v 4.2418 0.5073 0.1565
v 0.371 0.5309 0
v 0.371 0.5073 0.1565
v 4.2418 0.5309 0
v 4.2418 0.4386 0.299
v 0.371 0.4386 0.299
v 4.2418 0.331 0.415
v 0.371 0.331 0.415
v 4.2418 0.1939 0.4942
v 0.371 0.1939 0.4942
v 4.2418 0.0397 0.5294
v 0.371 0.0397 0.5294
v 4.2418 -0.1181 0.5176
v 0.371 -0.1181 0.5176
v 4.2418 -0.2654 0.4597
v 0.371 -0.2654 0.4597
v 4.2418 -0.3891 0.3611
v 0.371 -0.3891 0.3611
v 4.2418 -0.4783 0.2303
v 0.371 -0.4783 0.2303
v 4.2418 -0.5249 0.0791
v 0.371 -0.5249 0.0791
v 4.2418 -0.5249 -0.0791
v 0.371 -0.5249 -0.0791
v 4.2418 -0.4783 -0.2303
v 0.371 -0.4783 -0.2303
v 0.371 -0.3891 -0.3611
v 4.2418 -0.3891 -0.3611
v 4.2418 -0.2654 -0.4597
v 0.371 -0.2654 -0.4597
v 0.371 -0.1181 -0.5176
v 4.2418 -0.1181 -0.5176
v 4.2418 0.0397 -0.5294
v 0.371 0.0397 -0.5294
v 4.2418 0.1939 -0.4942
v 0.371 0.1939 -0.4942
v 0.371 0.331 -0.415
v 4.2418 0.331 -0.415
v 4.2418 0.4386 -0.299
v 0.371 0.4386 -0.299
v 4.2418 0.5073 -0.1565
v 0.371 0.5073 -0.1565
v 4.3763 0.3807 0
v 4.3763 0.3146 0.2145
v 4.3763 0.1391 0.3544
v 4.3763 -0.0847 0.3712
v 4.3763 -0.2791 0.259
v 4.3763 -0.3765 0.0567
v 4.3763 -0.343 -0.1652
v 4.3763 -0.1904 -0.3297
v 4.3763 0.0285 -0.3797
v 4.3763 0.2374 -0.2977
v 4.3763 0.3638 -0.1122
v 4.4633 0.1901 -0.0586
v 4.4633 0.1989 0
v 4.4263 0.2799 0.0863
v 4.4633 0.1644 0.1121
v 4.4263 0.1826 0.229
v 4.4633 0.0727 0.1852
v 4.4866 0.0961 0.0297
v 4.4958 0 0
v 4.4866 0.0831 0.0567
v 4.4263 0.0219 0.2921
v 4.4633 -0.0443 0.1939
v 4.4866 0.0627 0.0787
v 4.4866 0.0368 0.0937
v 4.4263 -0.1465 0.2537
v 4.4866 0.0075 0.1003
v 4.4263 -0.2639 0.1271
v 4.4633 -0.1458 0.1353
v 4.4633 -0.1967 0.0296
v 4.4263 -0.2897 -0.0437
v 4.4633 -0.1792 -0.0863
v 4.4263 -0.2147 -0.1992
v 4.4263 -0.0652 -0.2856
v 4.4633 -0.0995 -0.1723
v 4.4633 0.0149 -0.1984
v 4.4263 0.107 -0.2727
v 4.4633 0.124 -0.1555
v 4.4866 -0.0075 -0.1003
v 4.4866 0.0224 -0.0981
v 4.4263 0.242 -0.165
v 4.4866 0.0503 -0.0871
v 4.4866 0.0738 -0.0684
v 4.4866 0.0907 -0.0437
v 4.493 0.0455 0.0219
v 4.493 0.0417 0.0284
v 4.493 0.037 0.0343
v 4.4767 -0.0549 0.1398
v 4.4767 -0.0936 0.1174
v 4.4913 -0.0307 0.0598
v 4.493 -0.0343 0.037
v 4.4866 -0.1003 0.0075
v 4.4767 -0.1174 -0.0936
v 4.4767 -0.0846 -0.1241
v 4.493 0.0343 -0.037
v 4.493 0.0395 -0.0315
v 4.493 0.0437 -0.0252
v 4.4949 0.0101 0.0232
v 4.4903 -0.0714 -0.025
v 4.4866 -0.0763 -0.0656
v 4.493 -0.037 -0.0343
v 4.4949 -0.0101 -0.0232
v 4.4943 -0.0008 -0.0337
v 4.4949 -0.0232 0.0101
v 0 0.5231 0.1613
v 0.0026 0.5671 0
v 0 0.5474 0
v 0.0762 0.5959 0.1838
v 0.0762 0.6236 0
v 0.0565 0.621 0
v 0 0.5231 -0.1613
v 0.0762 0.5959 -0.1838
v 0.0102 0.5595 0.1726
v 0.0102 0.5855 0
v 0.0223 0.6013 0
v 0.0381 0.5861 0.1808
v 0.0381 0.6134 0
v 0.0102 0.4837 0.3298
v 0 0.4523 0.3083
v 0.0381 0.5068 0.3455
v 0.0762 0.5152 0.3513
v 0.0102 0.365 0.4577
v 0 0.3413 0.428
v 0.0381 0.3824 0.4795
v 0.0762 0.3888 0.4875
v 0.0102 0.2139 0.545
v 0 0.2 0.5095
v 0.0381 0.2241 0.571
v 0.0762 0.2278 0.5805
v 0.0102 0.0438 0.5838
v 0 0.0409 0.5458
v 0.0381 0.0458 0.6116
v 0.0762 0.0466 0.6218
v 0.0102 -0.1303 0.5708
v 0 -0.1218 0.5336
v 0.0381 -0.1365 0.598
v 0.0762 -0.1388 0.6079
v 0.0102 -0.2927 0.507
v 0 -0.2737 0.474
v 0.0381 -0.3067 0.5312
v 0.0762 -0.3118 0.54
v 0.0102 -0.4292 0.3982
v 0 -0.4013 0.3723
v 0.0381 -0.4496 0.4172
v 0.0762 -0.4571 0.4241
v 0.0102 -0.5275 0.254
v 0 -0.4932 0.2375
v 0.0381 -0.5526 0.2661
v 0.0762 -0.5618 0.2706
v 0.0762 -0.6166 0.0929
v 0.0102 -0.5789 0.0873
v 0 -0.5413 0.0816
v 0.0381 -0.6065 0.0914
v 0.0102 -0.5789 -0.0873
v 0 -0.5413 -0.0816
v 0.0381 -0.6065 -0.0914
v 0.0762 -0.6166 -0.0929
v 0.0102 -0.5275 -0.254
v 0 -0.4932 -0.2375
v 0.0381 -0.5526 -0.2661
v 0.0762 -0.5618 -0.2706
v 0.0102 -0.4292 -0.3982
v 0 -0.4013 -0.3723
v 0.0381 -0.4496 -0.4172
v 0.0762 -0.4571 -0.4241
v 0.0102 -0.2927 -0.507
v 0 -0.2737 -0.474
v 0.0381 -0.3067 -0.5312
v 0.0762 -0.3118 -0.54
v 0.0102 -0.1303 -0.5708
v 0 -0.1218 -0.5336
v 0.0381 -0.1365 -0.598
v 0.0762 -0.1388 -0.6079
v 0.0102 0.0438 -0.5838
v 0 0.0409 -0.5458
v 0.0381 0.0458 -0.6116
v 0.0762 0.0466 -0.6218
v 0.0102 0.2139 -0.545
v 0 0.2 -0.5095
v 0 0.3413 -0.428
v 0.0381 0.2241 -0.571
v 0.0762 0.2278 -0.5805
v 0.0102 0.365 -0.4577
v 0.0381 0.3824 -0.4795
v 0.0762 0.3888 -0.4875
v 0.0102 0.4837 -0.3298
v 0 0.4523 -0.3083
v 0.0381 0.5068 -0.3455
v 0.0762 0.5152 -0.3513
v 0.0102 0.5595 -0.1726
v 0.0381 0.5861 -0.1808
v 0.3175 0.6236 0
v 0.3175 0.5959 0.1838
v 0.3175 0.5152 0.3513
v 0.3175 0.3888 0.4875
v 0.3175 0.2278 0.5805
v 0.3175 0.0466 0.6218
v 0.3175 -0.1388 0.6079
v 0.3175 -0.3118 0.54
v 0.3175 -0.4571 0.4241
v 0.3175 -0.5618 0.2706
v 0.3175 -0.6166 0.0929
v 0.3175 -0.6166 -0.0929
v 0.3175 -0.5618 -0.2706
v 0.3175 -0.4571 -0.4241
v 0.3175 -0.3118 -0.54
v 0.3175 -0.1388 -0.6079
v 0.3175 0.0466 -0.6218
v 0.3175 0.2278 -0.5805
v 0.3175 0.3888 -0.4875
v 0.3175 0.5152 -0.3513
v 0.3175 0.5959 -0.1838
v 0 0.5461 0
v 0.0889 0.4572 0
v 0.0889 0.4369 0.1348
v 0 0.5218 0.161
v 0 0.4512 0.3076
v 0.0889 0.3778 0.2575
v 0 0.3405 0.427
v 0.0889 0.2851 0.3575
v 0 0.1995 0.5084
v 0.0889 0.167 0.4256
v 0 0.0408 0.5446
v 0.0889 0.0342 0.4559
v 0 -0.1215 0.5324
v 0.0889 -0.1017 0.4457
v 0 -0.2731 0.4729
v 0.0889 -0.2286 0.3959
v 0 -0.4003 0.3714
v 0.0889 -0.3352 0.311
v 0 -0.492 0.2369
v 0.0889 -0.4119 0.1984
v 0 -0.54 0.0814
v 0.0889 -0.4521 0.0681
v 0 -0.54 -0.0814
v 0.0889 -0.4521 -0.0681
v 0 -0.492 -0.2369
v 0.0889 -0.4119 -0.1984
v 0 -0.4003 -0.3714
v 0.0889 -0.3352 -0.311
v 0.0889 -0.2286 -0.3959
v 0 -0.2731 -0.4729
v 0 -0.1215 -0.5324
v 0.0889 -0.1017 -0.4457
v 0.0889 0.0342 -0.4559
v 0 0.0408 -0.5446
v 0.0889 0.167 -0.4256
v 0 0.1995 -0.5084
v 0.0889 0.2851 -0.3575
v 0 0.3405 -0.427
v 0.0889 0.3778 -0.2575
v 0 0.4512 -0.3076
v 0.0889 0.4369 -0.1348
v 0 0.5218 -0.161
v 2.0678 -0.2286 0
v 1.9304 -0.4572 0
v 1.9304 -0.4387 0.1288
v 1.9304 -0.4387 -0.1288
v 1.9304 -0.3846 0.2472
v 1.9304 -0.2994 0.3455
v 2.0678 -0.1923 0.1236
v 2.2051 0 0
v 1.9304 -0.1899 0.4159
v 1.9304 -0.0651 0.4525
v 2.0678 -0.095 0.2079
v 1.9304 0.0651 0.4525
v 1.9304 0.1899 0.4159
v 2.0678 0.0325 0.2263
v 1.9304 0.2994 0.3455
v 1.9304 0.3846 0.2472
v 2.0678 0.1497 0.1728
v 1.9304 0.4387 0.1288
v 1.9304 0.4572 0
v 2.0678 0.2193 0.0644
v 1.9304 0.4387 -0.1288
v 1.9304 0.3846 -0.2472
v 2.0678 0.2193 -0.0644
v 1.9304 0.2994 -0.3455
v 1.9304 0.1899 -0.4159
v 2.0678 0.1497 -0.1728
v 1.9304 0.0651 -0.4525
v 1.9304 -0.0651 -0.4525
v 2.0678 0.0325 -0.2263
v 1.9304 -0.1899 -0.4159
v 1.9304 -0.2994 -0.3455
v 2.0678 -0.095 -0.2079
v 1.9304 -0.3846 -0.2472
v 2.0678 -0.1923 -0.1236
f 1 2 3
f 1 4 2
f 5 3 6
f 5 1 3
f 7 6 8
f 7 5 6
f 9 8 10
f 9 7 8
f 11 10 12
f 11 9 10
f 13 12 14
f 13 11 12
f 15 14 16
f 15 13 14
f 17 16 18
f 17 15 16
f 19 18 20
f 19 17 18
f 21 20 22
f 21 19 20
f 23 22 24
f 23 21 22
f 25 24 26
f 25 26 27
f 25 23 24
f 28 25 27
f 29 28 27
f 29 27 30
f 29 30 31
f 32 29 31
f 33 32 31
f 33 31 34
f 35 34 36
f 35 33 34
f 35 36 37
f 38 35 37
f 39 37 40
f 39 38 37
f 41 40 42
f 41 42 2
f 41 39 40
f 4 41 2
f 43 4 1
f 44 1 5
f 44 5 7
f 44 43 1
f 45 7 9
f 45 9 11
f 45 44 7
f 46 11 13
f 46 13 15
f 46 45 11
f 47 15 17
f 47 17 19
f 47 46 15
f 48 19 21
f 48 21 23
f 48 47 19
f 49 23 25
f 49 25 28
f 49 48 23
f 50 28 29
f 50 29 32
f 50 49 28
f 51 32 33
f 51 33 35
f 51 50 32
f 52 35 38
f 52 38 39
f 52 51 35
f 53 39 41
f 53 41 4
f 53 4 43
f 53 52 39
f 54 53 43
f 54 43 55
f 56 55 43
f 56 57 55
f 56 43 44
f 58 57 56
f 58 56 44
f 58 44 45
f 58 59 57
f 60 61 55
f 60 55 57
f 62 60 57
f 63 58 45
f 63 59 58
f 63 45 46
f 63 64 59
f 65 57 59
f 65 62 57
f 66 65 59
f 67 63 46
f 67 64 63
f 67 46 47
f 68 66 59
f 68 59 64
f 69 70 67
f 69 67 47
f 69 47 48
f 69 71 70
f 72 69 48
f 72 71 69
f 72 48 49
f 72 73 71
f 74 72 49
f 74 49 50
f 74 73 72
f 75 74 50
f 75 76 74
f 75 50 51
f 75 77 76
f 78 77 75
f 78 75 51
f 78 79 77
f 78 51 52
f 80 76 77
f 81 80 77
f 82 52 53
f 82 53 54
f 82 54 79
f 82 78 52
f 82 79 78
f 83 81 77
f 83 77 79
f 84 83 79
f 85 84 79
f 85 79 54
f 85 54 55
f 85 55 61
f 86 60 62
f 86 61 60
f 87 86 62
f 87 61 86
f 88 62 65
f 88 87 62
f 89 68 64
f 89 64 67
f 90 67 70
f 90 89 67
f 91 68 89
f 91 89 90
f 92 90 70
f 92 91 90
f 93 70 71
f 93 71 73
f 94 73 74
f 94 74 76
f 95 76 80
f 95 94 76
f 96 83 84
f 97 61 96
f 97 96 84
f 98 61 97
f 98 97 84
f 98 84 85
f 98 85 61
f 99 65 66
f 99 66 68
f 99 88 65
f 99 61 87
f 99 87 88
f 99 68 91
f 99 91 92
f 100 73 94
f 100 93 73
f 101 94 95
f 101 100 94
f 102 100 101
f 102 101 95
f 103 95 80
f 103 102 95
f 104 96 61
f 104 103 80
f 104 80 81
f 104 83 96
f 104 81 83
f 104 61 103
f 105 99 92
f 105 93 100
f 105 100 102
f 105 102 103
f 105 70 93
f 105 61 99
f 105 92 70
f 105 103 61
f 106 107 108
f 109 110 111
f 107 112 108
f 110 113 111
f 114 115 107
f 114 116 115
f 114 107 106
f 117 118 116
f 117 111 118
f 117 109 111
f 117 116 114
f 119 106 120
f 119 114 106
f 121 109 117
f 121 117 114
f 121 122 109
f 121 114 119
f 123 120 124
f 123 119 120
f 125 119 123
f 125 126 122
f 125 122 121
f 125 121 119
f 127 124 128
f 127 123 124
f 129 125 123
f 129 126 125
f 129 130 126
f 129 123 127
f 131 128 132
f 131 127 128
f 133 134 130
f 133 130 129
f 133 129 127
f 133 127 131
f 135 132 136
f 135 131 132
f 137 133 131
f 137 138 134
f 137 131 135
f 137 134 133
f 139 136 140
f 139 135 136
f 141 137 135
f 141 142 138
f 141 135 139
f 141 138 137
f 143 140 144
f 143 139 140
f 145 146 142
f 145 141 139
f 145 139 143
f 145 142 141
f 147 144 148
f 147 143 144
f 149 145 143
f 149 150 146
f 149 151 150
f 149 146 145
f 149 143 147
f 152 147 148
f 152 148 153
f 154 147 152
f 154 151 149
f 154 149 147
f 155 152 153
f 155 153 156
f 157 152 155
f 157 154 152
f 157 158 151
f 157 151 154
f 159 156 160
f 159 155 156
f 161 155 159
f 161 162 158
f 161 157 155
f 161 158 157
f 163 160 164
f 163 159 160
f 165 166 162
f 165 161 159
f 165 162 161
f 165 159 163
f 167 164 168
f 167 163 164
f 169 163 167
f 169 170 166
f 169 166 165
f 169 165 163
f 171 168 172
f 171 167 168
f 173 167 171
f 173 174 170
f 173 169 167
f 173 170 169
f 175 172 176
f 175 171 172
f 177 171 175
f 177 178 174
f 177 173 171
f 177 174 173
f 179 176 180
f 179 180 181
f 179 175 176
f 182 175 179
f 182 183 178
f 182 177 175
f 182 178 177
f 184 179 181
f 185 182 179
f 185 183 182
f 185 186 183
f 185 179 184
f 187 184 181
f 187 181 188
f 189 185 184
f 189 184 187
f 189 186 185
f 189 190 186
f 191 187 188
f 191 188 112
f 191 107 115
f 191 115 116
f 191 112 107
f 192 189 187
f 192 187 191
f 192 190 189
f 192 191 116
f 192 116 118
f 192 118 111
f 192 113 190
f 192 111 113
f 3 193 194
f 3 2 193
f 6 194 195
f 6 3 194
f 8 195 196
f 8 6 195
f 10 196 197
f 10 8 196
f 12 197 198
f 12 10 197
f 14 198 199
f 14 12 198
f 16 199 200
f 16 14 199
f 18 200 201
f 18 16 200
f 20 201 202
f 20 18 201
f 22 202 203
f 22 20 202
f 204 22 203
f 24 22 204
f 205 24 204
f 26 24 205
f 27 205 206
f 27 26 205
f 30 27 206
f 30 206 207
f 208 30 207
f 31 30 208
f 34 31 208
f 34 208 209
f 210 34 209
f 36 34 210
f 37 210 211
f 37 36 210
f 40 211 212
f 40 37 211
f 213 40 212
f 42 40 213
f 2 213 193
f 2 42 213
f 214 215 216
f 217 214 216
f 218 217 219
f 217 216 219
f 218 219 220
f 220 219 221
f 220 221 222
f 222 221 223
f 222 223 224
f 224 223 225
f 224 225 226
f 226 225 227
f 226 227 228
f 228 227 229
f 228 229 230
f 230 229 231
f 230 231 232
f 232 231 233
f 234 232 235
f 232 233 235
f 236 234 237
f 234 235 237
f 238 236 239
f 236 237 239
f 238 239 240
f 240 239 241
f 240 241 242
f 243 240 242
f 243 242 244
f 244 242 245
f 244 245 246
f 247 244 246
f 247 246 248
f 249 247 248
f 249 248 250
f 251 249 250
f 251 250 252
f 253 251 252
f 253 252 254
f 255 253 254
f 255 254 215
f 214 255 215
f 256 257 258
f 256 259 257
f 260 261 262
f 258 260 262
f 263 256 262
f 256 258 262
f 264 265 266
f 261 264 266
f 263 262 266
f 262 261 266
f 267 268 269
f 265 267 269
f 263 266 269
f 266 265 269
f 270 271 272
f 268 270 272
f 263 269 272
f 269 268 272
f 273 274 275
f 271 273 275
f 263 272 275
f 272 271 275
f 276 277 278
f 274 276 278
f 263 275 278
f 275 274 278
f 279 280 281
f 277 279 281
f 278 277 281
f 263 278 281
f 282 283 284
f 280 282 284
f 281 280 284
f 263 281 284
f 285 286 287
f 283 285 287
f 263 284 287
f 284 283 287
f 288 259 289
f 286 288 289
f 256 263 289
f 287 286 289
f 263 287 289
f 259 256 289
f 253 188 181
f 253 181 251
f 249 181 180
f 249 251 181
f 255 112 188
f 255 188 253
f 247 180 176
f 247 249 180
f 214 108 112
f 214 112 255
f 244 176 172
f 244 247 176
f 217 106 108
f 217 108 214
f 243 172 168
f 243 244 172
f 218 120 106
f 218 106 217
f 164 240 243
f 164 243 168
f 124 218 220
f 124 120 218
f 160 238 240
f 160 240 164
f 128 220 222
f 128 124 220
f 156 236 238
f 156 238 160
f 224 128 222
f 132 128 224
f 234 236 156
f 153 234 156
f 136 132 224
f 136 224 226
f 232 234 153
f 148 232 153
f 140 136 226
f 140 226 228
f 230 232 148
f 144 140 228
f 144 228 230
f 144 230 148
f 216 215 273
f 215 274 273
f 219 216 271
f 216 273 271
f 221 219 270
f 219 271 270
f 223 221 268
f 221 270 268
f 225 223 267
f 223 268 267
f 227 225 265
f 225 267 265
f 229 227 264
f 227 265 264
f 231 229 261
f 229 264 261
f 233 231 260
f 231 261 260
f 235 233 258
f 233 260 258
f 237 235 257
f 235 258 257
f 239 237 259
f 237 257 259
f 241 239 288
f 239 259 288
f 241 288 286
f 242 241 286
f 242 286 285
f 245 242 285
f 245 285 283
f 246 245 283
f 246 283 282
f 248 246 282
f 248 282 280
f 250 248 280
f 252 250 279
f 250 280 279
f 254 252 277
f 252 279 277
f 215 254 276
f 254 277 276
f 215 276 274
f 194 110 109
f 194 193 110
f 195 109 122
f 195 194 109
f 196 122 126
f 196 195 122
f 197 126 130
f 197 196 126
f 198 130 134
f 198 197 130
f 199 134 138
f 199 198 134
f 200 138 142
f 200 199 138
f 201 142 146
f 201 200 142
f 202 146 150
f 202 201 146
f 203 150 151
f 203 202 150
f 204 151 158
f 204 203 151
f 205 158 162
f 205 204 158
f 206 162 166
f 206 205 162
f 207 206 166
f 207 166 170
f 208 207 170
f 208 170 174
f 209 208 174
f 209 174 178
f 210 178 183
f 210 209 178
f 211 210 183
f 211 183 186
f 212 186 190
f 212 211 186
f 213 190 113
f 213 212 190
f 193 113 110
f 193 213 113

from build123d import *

# Parameters (mm, degrees)
HOLE2_D           = 0.9144
HOLE2_DEPTH       = 1.9304
HOLE2_CSINK_D     = 1.0922
HOLE2_CSINK_ANGLE = 90
HOLE2_TIP         = 0.274713475


with BuildPart() as part:
    # Sketch1 → RevolutionAngle1 (revolve)
    with BuildSketch(Plane.XY):
        with BuildLine():
            Line((0, 0), (0, 0.54737))
            ThreePointArc((0, 0.54737), (0.022318463, 0.601251537), (0.0762, 0.62357))
            Line((0.0762, 0.62357), (0.3175, 0.62357))
            Line((0.3175, 0.62357), (0.371026143, 0.53086))
            Line((0.371026143, 0.53086), (4.2418, 0.53086))
            ThreePointArc((4.2418, 0.53086), (4.42628421, 0.292934407), (4.4958, 0))
            Line((4.4958, 0), (0, 0))
        make_face()
    revolve(axis=Axis((0, 0, 0), (1, 0, 0)))

    # Hole2
    with Locations(Plane(origin=(0, 0, 0), x_dir=(0, -1, 0), z_dir=(-1, 0, 0))):
        with Locations((0, 0)):
            CounterSinkHole(HOLE2_D / 2, HOLE2_CSINK_D / 2, depth=HOLE2_DEPTH, counter_sink_angle=HOLE2_CSINK_ANGLE)
            with Locations((0, 0, -(HOLE2_DEPTH + HOLE2_TIP / 2))):  # 118° drill point
                Cone(0, HOLE2_D / 2, HOLE2_TIP, mode=Mode.SUBTRACT)


solid = part.part
